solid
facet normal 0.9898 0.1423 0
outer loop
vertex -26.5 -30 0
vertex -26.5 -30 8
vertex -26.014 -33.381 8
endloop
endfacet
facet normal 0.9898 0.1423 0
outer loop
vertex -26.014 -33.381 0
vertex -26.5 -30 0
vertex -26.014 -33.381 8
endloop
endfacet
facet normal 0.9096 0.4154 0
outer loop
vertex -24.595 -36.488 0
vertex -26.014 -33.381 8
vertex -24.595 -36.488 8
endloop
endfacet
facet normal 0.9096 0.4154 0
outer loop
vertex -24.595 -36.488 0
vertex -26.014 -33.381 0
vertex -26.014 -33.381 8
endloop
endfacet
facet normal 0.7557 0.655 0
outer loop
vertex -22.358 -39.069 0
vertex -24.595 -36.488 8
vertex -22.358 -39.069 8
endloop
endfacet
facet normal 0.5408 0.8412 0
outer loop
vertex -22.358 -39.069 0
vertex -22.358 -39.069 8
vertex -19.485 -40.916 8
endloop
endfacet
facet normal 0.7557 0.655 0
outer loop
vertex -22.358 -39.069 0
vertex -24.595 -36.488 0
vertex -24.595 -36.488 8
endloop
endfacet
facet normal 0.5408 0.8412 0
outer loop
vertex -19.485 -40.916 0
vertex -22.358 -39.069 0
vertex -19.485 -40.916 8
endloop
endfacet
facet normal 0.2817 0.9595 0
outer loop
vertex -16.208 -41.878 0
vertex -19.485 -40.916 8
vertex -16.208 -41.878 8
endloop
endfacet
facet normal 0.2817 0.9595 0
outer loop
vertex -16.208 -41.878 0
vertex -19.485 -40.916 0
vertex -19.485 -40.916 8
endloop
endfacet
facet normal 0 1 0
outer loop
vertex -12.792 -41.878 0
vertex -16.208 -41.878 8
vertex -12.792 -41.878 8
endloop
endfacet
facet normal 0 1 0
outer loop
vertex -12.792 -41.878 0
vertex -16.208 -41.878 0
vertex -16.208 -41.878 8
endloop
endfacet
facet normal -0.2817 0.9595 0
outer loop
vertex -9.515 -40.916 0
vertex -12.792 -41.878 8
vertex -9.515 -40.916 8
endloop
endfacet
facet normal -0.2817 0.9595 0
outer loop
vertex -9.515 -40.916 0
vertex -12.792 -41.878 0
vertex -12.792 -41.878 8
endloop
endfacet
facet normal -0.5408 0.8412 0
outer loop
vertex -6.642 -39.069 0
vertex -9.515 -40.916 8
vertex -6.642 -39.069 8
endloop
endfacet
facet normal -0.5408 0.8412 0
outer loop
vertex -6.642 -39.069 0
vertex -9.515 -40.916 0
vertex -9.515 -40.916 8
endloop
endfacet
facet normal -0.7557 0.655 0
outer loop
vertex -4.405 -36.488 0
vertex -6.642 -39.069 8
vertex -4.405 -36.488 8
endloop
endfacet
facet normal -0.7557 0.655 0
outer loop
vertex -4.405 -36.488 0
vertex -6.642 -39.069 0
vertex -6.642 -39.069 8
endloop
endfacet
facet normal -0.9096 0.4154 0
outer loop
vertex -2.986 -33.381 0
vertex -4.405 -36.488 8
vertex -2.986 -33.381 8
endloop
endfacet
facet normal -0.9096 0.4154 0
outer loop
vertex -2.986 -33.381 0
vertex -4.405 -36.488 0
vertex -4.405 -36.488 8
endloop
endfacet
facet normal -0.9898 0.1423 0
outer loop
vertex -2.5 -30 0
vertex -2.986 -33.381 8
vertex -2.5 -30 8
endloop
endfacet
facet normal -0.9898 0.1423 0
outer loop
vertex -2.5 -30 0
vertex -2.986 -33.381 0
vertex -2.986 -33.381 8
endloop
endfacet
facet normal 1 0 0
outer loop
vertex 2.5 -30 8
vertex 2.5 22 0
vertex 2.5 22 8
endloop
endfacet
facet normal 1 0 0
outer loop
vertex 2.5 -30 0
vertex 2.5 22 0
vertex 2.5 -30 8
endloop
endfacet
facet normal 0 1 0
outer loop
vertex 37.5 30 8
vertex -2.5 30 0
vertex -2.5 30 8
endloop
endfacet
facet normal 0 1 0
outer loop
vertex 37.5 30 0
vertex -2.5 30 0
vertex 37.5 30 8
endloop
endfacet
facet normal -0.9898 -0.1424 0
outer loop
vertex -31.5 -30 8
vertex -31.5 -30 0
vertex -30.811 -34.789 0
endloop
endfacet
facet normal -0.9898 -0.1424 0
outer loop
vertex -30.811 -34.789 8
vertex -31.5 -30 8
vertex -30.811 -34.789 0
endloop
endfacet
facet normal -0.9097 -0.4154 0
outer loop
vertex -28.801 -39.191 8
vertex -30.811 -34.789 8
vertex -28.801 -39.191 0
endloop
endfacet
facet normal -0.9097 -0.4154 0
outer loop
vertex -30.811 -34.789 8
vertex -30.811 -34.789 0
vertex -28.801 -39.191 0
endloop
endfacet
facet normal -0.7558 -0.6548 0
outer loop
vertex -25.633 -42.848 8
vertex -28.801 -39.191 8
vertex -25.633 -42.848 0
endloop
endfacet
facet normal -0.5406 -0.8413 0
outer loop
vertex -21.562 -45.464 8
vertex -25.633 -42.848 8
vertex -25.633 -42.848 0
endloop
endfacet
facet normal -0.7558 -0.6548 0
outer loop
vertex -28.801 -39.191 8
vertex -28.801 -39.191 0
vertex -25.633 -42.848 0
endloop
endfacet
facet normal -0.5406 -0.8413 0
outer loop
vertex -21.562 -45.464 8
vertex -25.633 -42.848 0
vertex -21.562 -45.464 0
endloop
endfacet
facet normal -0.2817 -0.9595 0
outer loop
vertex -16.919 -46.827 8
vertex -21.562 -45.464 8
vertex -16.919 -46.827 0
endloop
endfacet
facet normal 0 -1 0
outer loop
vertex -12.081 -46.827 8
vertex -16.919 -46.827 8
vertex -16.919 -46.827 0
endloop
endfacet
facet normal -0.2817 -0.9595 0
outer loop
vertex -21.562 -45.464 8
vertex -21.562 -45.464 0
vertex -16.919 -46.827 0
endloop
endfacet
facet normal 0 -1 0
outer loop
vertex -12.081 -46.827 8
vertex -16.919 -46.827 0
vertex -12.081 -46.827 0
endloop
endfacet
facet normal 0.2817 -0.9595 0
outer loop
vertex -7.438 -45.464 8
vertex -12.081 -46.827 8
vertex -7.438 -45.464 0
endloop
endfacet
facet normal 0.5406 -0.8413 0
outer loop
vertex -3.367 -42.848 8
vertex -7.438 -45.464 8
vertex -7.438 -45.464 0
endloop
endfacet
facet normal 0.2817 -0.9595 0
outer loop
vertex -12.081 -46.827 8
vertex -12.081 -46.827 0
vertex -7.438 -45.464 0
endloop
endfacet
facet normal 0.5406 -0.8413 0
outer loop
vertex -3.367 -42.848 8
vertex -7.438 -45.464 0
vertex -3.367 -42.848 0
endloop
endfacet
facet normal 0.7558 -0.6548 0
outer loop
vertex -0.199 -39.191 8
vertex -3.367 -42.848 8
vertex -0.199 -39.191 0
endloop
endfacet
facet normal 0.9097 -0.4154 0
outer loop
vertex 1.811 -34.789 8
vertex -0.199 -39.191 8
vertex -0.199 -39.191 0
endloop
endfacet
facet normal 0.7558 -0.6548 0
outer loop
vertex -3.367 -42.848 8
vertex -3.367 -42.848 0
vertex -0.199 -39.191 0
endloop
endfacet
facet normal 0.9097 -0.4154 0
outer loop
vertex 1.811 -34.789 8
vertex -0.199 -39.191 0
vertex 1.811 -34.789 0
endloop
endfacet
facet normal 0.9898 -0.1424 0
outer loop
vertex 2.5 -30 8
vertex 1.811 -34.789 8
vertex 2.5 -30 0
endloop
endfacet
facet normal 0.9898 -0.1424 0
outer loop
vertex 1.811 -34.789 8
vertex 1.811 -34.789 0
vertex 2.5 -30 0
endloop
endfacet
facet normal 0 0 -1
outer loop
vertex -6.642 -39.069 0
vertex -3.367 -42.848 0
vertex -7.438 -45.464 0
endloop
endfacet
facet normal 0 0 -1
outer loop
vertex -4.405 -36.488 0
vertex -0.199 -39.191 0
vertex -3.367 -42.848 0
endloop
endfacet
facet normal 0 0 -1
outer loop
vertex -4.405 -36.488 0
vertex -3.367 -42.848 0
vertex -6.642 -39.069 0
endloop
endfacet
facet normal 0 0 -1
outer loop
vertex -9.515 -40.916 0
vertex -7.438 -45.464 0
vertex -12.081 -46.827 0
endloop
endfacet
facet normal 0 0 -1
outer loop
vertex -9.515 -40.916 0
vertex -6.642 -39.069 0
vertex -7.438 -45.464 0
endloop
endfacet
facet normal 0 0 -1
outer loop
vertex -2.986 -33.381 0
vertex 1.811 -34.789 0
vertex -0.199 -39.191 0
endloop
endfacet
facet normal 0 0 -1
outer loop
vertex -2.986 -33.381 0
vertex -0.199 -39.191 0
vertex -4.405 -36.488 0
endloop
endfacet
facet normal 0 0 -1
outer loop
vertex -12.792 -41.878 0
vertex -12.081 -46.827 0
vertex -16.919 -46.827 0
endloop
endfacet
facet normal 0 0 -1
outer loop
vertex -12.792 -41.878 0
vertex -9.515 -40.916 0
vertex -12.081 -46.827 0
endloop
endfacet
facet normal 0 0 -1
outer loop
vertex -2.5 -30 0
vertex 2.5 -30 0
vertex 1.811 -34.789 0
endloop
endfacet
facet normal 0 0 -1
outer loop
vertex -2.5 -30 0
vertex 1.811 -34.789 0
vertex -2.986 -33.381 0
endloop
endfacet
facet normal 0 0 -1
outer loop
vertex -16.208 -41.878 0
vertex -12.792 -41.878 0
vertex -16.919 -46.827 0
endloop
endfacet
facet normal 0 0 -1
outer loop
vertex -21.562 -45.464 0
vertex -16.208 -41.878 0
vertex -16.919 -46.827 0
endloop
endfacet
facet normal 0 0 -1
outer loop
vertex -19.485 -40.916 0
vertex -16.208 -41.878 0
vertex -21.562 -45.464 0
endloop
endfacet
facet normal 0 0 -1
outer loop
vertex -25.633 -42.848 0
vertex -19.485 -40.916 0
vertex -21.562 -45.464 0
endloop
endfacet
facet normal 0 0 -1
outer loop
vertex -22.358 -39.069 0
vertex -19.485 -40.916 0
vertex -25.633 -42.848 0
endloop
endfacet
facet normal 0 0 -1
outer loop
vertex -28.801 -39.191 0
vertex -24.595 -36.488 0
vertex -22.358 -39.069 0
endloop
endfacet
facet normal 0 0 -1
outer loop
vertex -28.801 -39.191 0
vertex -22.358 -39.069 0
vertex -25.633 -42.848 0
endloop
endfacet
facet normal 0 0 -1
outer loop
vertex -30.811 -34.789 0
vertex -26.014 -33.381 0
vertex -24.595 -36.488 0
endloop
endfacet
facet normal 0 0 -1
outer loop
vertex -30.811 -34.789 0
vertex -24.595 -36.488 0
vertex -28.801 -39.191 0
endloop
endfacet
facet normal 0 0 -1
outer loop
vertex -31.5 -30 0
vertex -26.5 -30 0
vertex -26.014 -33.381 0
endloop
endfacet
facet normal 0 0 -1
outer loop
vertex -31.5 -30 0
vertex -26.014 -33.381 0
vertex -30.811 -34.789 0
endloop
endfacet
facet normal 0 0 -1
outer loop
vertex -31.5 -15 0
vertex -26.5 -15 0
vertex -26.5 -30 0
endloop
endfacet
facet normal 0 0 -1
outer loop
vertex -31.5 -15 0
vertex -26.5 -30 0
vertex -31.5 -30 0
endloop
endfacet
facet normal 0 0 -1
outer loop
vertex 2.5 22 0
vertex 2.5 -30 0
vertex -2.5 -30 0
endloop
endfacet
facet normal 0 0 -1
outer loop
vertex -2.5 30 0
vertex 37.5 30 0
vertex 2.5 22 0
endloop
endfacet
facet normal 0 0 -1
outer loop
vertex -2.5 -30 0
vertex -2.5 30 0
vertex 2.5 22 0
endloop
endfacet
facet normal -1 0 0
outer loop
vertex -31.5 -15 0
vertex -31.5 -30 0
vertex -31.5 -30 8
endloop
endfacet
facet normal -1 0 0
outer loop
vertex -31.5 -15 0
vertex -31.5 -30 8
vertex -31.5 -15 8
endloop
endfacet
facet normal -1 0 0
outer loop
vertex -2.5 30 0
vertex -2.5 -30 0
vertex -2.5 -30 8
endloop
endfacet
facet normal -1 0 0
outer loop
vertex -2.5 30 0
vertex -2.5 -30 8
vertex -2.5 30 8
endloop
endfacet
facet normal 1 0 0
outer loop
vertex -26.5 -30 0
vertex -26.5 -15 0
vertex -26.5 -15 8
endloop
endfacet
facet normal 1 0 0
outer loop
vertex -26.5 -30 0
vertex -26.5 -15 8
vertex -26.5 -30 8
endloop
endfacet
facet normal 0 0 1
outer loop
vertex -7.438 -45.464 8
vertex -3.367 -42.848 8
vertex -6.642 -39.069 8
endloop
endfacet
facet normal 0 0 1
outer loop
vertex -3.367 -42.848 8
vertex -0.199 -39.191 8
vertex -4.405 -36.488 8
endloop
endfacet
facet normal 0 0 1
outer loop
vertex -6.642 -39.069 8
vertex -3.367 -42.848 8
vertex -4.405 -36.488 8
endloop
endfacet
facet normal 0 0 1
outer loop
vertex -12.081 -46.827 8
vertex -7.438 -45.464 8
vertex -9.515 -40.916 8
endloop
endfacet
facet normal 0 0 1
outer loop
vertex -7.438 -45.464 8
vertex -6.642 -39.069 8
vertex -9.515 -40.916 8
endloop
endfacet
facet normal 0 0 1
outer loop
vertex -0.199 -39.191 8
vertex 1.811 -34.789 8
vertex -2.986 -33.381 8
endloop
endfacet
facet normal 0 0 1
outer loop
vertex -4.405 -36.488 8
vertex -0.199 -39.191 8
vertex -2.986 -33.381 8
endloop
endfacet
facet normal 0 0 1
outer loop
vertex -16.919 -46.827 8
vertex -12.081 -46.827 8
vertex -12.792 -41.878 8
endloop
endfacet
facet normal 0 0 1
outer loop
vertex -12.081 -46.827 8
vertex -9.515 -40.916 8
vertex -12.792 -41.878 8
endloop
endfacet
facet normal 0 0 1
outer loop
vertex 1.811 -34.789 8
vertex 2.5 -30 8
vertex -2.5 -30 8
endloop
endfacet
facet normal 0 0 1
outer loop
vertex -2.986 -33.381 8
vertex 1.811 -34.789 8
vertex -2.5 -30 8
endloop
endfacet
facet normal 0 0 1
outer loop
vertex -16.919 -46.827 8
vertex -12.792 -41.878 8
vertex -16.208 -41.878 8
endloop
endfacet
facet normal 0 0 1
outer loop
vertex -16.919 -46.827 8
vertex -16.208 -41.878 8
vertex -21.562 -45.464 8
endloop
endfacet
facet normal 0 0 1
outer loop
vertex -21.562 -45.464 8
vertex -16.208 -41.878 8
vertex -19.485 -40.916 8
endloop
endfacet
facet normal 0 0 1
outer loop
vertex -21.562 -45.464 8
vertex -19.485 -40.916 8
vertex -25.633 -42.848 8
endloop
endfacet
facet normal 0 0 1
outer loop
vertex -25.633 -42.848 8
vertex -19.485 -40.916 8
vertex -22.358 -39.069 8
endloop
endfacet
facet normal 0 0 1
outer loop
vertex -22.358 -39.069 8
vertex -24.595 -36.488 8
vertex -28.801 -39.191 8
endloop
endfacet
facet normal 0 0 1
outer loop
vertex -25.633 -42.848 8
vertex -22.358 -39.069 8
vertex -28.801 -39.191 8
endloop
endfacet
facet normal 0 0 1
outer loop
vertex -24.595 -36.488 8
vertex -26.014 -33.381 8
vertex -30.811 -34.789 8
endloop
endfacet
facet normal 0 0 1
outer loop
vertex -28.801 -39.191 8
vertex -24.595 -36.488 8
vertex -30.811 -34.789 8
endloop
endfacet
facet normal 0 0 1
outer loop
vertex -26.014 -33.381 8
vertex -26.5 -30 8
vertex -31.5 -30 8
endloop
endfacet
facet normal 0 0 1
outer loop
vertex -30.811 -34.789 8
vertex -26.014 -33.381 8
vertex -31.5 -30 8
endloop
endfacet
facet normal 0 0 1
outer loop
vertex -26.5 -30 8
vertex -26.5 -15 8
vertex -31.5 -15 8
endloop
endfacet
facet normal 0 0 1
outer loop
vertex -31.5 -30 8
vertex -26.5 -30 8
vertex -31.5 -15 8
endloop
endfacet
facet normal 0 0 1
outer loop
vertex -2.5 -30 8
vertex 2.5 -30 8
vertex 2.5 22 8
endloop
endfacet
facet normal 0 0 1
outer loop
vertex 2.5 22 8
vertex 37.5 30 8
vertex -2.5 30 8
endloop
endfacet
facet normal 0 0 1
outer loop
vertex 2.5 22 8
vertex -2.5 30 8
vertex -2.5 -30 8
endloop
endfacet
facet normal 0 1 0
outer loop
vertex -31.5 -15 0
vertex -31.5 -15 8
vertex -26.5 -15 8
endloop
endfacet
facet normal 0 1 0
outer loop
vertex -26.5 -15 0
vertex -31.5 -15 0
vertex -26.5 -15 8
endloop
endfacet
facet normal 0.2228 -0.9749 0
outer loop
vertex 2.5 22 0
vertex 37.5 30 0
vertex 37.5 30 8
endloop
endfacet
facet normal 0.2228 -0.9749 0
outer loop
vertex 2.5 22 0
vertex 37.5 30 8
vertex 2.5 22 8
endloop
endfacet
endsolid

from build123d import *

# Parameters (mm, degrees)
PAD_DEPTH = 8


with BuildPart() as part:
    # Sketch → Pad (new body)
    with BuildSketch(Plane.XY):
        with BuildLine():
            Line((-2.5, 30), (37.5, 30))
            Line((37.5, 30), (2.5, 22))
            Line((2.5, 22), (2.5, -30))
            ThreePointArc((-31.5, -29.999997), (-14.500001, -46.999997), (2.5, -30))
            Line((-31.5, -29.999997), (-31.5, -14.999997))
            Line((-31.5, -14.999997), (-26.5, -14.999997))
            Line((-26.5, -14.999997), (-26.5, -29.999997))
            ThreePointArc((-26.5, -29.999997), (-14.500001, -41.999997), (-2.5, -30))
            Line((-2.5, -30), (-2.5, 30))
        make_face()
    extrude(amount=PAD_DEPTH)


solid = part.part
